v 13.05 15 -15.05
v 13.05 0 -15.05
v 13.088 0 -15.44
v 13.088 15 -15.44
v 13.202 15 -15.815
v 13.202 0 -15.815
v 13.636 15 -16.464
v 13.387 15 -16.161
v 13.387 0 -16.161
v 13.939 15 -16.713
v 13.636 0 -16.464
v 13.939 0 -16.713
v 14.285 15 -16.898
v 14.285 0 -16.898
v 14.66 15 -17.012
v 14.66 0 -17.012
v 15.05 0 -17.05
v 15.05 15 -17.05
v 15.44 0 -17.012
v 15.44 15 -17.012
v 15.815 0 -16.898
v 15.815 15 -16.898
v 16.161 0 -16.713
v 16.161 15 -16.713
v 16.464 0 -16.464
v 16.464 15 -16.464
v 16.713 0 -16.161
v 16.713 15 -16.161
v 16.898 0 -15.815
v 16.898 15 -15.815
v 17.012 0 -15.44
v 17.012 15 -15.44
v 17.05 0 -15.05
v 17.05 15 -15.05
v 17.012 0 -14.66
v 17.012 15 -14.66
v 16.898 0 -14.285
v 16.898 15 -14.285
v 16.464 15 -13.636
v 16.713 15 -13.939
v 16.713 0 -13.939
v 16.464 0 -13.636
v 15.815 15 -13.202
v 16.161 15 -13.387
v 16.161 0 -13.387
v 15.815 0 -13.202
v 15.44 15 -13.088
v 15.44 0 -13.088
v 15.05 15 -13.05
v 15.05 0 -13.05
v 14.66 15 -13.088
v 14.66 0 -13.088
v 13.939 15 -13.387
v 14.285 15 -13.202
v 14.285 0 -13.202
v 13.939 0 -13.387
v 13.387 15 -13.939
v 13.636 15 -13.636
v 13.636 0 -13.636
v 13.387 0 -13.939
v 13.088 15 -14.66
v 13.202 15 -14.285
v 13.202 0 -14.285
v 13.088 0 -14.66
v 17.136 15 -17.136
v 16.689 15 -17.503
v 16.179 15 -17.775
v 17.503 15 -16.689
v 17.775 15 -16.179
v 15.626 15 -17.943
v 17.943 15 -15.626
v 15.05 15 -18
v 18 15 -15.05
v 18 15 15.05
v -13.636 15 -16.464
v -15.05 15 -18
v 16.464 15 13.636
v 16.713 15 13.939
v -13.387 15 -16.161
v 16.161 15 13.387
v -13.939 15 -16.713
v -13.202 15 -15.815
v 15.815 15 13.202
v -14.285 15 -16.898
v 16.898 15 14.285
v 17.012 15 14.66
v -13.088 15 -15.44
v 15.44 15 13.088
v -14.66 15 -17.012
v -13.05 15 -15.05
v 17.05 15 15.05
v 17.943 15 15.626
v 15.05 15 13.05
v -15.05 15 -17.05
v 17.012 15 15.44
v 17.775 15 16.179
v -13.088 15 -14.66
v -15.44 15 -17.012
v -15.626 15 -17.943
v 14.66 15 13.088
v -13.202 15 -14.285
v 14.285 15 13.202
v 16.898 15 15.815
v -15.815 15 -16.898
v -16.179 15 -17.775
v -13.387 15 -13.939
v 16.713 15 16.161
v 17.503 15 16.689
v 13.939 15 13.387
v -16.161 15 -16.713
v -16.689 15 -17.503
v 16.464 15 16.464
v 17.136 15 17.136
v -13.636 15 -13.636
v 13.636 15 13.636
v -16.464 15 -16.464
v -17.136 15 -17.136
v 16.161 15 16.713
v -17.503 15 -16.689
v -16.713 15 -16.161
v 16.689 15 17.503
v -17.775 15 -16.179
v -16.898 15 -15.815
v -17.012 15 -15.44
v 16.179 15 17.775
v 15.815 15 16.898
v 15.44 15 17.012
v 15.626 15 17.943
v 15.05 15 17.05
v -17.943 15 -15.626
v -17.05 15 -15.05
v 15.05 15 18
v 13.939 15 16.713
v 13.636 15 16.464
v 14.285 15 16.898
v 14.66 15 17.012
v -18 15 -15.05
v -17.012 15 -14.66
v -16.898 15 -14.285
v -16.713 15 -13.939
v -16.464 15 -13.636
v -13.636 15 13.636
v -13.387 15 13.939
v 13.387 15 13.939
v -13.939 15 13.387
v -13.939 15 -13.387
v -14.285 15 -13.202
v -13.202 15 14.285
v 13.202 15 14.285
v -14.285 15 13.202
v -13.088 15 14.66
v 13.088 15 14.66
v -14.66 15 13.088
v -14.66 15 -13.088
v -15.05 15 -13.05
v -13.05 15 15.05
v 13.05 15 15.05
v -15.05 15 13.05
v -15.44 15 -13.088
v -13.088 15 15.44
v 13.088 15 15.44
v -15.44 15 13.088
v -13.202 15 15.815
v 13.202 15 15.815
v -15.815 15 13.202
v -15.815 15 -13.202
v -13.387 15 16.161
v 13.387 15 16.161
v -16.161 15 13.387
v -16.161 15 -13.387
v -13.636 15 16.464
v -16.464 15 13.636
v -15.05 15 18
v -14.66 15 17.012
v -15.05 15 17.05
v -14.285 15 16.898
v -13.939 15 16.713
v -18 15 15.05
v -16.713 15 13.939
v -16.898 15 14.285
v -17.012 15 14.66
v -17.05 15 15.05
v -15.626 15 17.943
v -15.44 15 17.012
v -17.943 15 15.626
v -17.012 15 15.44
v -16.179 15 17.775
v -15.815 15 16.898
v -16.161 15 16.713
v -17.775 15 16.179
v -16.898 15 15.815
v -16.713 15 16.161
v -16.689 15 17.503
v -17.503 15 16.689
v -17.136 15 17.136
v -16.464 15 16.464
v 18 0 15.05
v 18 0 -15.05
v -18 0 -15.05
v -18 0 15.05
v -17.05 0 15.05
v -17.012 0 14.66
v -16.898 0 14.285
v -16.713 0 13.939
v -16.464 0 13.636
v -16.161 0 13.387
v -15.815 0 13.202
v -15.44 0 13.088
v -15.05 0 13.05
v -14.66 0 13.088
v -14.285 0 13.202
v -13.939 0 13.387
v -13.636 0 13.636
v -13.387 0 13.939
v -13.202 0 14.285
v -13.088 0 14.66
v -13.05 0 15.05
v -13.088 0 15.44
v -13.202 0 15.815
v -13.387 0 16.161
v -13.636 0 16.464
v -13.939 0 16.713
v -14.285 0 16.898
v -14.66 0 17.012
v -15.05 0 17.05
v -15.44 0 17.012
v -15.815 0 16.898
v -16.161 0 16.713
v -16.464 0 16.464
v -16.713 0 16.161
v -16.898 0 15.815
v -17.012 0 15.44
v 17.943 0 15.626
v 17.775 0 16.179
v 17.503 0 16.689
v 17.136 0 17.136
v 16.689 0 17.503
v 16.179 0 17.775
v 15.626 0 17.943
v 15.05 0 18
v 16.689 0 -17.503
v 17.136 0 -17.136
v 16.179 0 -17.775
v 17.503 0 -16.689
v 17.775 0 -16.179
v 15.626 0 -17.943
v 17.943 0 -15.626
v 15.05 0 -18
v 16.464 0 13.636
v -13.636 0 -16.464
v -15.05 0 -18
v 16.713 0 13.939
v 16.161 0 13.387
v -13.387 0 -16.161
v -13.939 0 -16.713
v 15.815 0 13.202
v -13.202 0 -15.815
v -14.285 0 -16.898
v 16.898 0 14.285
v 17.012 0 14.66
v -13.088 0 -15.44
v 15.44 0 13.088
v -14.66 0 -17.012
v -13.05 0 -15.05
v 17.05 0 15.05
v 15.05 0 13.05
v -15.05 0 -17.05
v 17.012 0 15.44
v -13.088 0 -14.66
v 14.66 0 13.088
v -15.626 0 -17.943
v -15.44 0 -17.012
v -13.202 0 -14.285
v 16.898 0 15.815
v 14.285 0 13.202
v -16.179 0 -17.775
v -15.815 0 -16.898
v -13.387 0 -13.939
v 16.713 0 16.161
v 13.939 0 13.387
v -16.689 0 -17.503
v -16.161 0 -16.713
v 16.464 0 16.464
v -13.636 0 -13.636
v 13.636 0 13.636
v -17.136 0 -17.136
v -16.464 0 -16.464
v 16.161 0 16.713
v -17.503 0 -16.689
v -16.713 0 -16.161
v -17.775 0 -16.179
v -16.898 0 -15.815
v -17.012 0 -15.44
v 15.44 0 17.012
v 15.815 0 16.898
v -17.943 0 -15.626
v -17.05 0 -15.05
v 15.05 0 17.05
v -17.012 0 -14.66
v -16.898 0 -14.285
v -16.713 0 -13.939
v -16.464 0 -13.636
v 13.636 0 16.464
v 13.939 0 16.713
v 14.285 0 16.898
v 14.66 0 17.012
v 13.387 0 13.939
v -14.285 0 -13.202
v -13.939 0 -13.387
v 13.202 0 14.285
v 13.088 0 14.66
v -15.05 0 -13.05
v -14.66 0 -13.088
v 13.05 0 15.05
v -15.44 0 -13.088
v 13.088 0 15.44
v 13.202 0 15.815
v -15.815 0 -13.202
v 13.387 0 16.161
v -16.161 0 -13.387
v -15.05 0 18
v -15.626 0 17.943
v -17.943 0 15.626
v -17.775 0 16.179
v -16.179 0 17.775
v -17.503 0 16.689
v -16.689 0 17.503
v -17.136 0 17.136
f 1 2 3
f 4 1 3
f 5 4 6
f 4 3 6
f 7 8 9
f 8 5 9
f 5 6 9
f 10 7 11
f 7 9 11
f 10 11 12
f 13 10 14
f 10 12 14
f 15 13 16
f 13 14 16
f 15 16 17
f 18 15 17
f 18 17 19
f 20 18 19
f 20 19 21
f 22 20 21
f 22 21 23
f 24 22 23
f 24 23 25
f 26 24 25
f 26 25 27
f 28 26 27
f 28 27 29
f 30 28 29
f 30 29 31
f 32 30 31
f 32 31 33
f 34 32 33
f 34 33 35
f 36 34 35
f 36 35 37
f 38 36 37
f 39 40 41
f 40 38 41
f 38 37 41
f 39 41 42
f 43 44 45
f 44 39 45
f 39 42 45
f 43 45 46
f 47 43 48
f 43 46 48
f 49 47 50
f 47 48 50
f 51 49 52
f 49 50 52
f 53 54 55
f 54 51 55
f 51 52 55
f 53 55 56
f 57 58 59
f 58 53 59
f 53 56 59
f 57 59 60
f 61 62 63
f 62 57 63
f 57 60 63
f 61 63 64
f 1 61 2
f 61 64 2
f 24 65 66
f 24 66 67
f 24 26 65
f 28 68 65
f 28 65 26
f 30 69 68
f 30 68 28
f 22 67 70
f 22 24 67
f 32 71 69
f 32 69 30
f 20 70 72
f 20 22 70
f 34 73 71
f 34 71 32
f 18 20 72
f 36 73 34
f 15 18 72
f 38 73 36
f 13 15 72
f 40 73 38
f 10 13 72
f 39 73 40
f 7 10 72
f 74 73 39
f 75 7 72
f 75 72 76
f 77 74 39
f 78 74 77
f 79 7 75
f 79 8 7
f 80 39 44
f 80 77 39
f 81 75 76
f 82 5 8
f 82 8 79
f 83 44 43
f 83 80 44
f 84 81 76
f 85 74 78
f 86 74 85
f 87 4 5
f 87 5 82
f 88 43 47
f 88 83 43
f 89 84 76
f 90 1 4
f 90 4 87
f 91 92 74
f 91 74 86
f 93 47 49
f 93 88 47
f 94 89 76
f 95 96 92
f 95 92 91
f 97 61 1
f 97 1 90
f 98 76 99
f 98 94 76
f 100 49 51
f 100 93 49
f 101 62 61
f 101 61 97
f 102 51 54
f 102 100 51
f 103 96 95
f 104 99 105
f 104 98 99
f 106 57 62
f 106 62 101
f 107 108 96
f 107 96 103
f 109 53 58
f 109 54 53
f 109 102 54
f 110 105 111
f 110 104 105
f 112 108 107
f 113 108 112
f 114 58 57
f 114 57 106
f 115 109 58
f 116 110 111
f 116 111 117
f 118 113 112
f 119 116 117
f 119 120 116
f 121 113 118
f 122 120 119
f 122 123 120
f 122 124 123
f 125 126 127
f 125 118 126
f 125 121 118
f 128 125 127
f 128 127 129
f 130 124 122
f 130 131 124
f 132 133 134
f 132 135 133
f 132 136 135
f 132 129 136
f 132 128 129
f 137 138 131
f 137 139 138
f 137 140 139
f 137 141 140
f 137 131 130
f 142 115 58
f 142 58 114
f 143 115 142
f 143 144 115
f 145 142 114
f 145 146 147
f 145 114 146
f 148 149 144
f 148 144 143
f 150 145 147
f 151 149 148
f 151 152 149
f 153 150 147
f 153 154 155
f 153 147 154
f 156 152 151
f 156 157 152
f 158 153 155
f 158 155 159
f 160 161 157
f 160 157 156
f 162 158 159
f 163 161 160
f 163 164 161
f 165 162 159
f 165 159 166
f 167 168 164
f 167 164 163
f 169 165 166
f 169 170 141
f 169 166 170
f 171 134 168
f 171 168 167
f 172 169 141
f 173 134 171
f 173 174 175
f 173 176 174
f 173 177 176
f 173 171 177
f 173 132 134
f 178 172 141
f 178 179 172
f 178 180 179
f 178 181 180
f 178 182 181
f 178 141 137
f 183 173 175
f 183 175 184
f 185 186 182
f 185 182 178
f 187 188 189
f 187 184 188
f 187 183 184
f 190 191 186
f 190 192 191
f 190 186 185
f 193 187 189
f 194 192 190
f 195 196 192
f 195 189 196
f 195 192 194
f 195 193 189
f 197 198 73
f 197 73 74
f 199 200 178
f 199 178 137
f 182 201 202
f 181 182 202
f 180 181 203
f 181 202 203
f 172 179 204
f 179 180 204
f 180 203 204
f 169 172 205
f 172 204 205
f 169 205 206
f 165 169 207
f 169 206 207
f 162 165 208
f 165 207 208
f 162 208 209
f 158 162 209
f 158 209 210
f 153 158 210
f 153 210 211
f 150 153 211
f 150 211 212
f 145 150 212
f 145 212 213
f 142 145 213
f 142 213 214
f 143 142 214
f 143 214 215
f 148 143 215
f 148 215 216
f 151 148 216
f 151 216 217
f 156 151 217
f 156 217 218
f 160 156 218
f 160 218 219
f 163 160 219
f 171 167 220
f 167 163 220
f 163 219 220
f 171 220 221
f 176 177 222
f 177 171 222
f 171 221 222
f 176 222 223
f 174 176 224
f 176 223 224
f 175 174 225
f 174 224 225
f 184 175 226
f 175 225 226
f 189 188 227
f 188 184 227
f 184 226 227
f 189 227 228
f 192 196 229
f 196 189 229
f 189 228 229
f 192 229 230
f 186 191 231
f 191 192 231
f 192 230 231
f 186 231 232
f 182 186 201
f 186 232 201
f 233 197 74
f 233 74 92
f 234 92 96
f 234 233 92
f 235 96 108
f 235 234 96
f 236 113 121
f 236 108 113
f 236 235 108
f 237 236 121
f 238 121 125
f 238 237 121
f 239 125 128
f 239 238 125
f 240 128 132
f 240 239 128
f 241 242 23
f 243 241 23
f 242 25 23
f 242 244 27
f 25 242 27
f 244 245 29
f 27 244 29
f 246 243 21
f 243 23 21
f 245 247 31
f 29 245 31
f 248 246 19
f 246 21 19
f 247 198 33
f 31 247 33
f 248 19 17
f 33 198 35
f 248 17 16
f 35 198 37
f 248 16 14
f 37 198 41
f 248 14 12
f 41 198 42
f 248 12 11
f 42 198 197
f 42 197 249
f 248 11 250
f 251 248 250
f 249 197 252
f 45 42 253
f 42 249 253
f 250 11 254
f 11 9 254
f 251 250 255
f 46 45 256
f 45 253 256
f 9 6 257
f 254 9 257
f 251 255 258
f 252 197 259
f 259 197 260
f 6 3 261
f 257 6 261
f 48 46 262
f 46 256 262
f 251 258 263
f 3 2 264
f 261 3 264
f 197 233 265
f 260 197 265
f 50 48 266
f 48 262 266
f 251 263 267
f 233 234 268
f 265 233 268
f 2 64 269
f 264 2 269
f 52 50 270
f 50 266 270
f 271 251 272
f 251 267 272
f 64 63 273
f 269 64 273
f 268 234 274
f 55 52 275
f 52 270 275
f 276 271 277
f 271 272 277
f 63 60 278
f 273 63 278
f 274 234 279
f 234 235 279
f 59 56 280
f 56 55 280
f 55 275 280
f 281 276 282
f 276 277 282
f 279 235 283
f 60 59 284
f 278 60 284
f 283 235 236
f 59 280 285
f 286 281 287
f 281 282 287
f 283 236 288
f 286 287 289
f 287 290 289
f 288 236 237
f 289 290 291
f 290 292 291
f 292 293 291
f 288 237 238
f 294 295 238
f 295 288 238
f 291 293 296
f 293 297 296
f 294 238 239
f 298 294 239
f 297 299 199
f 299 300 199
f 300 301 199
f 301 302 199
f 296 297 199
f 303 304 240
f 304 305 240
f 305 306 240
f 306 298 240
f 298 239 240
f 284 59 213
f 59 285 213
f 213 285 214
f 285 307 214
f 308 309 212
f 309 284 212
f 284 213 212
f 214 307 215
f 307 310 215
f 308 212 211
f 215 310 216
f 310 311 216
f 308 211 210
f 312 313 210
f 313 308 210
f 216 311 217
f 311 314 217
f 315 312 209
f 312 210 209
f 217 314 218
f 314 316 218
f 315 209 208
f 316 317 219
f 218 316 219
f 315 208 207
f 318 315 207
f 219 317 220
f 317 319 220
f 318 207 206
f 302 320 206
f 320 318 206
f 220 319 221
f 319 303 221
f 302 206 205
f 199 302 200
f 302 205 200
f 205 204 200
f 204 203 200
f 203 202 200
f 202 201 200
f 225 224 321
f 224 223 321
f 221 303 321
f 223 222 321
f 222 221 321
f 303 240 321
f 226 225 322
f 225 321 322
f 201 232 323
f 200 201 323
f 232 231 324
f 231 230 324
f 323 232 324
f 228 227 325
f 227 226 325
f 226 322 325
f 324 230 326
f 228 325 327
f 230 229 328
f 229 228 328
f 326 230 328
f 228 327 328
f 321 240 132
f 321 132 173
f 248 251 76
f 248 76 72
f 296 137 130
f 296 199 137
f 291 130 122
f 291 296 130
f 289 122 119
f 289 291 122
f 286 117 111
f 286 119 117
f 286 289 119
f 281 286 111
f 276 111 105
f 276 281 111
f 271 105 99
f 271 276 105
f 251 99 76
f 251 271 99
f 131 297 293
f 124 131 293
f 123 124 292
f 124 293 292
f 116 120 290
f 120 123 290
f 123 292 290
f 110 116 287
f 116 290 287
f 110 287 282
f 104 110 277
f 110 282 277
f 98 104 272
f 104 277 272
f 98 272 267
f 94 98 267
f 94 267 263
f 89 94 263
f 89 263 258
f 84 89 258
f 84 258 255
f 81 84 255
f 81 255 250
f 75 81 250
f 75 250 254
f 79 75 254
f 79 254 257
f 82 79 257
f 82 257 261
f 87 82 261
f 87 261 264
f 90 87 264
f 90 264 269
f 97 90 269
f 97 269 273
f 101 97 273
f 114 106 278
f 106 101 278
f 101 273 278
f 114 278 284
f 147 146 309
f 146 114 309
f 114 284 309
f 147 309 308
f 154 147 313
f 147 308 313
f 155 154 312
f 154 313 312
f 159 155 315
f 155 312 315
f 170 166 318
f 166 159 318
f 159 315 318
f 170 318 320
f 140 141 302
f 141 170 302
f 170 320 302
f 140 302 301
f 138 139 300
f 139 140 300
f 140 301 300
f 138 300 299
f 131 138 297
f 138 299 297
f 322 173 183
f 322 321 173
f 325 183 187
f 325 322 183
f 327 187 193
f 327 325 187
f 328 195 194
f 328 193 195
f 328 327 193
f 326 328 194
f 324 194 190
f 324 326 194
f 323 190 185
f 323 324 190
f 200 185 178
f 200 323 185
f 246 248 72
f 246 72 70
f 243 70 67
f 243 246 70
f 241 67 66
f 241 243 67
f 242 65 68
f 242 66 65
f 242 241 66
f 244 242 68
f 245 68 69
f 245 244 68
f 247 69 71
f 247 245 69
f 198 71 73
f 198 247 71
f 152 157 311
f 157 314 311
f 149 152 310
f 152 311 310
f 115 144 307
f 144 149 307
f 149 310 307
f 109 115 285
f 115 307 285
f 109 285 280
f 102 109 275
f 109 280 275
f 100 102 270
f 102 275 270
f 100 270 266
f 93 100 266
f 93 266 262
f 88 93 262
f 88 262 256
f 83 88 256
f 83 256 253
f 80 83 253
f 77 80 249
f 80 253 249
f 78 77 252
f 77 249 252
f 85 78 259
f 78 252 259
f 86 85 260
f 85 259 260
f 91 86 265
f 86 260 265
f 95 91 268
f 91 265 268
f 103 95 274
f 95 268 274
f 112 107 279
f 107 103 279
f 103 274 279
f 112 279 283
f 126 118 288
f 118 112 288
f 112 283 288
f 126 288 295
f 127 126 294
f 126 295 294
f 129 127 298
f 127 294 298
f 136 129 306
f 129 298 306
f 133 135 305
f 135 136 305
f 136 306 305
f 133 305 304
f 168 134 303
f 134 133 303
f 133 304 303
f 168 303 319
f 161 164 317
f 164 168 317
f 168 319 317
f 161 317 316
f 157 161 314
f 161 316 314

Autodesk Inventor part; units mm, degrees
ref_plane "YZ Plane" through (0, 0, 0) normal (1, 0, 0) x (0, 1, 0)
ref_plane "XZ Plane" through (0, 0, 0) normal (0, 1, 0) x (-1, 0, 0)
ref_plane "XY Plane" through (0, 0, 0) normal (0, 0, 1) x (1, 0, 0)
sketch "Sketch1" plane through (0, 0, 0) normal (0, 1, 0) x (-1, 0, 0)
  line L0 (-15.05, 18) -> (15.05, 18)
  line L1 (18, 15.05) -> (18, -15.05)
  line L2 (15.05, -18) -> (-15.05, -18)
  line L3 (-18, -15.05) -> (-18, 15.05)
  line L4 (-18, 18) -> (18, -18) construction
  line L5 (18, 18) -> (-18, -18) construction
  circle A0 centre (15.05, 15.05) radius 2
  circle A1 centre (-15.05, 15.05) radius 2
  circle A2 centre (-15.05, -15.05) radius 2
  circle A3 centre (15.05, -15.05) radius 2
  arc A4 (18, 15.05) -> (15.05, 18) centre (15.05, 15.05) ccw
  arc A5 (15.05, -18) -> (18, -15.05) centre (15.05, -15.05) ccw
  arc A6 (-18, -15.05) -> (-15.05, -18) centre (-15.05, -15.05) ccw
  arc A7 (-15.05, 18) -> (-18, 15.05) centre (-15.05, 15.05) ccw
  point P0 (0, 0)
  dimension "d0" = 36
  dimension "d1" = 36
  dimension "d2" = 4
  dimension "d3" = 15.05
  dimension "d6" = 360
  dimension "d8" = 2.95
extrude "Extrusion1" add sketch "Sketch1" along normal blind 15
properties part number "FC"
